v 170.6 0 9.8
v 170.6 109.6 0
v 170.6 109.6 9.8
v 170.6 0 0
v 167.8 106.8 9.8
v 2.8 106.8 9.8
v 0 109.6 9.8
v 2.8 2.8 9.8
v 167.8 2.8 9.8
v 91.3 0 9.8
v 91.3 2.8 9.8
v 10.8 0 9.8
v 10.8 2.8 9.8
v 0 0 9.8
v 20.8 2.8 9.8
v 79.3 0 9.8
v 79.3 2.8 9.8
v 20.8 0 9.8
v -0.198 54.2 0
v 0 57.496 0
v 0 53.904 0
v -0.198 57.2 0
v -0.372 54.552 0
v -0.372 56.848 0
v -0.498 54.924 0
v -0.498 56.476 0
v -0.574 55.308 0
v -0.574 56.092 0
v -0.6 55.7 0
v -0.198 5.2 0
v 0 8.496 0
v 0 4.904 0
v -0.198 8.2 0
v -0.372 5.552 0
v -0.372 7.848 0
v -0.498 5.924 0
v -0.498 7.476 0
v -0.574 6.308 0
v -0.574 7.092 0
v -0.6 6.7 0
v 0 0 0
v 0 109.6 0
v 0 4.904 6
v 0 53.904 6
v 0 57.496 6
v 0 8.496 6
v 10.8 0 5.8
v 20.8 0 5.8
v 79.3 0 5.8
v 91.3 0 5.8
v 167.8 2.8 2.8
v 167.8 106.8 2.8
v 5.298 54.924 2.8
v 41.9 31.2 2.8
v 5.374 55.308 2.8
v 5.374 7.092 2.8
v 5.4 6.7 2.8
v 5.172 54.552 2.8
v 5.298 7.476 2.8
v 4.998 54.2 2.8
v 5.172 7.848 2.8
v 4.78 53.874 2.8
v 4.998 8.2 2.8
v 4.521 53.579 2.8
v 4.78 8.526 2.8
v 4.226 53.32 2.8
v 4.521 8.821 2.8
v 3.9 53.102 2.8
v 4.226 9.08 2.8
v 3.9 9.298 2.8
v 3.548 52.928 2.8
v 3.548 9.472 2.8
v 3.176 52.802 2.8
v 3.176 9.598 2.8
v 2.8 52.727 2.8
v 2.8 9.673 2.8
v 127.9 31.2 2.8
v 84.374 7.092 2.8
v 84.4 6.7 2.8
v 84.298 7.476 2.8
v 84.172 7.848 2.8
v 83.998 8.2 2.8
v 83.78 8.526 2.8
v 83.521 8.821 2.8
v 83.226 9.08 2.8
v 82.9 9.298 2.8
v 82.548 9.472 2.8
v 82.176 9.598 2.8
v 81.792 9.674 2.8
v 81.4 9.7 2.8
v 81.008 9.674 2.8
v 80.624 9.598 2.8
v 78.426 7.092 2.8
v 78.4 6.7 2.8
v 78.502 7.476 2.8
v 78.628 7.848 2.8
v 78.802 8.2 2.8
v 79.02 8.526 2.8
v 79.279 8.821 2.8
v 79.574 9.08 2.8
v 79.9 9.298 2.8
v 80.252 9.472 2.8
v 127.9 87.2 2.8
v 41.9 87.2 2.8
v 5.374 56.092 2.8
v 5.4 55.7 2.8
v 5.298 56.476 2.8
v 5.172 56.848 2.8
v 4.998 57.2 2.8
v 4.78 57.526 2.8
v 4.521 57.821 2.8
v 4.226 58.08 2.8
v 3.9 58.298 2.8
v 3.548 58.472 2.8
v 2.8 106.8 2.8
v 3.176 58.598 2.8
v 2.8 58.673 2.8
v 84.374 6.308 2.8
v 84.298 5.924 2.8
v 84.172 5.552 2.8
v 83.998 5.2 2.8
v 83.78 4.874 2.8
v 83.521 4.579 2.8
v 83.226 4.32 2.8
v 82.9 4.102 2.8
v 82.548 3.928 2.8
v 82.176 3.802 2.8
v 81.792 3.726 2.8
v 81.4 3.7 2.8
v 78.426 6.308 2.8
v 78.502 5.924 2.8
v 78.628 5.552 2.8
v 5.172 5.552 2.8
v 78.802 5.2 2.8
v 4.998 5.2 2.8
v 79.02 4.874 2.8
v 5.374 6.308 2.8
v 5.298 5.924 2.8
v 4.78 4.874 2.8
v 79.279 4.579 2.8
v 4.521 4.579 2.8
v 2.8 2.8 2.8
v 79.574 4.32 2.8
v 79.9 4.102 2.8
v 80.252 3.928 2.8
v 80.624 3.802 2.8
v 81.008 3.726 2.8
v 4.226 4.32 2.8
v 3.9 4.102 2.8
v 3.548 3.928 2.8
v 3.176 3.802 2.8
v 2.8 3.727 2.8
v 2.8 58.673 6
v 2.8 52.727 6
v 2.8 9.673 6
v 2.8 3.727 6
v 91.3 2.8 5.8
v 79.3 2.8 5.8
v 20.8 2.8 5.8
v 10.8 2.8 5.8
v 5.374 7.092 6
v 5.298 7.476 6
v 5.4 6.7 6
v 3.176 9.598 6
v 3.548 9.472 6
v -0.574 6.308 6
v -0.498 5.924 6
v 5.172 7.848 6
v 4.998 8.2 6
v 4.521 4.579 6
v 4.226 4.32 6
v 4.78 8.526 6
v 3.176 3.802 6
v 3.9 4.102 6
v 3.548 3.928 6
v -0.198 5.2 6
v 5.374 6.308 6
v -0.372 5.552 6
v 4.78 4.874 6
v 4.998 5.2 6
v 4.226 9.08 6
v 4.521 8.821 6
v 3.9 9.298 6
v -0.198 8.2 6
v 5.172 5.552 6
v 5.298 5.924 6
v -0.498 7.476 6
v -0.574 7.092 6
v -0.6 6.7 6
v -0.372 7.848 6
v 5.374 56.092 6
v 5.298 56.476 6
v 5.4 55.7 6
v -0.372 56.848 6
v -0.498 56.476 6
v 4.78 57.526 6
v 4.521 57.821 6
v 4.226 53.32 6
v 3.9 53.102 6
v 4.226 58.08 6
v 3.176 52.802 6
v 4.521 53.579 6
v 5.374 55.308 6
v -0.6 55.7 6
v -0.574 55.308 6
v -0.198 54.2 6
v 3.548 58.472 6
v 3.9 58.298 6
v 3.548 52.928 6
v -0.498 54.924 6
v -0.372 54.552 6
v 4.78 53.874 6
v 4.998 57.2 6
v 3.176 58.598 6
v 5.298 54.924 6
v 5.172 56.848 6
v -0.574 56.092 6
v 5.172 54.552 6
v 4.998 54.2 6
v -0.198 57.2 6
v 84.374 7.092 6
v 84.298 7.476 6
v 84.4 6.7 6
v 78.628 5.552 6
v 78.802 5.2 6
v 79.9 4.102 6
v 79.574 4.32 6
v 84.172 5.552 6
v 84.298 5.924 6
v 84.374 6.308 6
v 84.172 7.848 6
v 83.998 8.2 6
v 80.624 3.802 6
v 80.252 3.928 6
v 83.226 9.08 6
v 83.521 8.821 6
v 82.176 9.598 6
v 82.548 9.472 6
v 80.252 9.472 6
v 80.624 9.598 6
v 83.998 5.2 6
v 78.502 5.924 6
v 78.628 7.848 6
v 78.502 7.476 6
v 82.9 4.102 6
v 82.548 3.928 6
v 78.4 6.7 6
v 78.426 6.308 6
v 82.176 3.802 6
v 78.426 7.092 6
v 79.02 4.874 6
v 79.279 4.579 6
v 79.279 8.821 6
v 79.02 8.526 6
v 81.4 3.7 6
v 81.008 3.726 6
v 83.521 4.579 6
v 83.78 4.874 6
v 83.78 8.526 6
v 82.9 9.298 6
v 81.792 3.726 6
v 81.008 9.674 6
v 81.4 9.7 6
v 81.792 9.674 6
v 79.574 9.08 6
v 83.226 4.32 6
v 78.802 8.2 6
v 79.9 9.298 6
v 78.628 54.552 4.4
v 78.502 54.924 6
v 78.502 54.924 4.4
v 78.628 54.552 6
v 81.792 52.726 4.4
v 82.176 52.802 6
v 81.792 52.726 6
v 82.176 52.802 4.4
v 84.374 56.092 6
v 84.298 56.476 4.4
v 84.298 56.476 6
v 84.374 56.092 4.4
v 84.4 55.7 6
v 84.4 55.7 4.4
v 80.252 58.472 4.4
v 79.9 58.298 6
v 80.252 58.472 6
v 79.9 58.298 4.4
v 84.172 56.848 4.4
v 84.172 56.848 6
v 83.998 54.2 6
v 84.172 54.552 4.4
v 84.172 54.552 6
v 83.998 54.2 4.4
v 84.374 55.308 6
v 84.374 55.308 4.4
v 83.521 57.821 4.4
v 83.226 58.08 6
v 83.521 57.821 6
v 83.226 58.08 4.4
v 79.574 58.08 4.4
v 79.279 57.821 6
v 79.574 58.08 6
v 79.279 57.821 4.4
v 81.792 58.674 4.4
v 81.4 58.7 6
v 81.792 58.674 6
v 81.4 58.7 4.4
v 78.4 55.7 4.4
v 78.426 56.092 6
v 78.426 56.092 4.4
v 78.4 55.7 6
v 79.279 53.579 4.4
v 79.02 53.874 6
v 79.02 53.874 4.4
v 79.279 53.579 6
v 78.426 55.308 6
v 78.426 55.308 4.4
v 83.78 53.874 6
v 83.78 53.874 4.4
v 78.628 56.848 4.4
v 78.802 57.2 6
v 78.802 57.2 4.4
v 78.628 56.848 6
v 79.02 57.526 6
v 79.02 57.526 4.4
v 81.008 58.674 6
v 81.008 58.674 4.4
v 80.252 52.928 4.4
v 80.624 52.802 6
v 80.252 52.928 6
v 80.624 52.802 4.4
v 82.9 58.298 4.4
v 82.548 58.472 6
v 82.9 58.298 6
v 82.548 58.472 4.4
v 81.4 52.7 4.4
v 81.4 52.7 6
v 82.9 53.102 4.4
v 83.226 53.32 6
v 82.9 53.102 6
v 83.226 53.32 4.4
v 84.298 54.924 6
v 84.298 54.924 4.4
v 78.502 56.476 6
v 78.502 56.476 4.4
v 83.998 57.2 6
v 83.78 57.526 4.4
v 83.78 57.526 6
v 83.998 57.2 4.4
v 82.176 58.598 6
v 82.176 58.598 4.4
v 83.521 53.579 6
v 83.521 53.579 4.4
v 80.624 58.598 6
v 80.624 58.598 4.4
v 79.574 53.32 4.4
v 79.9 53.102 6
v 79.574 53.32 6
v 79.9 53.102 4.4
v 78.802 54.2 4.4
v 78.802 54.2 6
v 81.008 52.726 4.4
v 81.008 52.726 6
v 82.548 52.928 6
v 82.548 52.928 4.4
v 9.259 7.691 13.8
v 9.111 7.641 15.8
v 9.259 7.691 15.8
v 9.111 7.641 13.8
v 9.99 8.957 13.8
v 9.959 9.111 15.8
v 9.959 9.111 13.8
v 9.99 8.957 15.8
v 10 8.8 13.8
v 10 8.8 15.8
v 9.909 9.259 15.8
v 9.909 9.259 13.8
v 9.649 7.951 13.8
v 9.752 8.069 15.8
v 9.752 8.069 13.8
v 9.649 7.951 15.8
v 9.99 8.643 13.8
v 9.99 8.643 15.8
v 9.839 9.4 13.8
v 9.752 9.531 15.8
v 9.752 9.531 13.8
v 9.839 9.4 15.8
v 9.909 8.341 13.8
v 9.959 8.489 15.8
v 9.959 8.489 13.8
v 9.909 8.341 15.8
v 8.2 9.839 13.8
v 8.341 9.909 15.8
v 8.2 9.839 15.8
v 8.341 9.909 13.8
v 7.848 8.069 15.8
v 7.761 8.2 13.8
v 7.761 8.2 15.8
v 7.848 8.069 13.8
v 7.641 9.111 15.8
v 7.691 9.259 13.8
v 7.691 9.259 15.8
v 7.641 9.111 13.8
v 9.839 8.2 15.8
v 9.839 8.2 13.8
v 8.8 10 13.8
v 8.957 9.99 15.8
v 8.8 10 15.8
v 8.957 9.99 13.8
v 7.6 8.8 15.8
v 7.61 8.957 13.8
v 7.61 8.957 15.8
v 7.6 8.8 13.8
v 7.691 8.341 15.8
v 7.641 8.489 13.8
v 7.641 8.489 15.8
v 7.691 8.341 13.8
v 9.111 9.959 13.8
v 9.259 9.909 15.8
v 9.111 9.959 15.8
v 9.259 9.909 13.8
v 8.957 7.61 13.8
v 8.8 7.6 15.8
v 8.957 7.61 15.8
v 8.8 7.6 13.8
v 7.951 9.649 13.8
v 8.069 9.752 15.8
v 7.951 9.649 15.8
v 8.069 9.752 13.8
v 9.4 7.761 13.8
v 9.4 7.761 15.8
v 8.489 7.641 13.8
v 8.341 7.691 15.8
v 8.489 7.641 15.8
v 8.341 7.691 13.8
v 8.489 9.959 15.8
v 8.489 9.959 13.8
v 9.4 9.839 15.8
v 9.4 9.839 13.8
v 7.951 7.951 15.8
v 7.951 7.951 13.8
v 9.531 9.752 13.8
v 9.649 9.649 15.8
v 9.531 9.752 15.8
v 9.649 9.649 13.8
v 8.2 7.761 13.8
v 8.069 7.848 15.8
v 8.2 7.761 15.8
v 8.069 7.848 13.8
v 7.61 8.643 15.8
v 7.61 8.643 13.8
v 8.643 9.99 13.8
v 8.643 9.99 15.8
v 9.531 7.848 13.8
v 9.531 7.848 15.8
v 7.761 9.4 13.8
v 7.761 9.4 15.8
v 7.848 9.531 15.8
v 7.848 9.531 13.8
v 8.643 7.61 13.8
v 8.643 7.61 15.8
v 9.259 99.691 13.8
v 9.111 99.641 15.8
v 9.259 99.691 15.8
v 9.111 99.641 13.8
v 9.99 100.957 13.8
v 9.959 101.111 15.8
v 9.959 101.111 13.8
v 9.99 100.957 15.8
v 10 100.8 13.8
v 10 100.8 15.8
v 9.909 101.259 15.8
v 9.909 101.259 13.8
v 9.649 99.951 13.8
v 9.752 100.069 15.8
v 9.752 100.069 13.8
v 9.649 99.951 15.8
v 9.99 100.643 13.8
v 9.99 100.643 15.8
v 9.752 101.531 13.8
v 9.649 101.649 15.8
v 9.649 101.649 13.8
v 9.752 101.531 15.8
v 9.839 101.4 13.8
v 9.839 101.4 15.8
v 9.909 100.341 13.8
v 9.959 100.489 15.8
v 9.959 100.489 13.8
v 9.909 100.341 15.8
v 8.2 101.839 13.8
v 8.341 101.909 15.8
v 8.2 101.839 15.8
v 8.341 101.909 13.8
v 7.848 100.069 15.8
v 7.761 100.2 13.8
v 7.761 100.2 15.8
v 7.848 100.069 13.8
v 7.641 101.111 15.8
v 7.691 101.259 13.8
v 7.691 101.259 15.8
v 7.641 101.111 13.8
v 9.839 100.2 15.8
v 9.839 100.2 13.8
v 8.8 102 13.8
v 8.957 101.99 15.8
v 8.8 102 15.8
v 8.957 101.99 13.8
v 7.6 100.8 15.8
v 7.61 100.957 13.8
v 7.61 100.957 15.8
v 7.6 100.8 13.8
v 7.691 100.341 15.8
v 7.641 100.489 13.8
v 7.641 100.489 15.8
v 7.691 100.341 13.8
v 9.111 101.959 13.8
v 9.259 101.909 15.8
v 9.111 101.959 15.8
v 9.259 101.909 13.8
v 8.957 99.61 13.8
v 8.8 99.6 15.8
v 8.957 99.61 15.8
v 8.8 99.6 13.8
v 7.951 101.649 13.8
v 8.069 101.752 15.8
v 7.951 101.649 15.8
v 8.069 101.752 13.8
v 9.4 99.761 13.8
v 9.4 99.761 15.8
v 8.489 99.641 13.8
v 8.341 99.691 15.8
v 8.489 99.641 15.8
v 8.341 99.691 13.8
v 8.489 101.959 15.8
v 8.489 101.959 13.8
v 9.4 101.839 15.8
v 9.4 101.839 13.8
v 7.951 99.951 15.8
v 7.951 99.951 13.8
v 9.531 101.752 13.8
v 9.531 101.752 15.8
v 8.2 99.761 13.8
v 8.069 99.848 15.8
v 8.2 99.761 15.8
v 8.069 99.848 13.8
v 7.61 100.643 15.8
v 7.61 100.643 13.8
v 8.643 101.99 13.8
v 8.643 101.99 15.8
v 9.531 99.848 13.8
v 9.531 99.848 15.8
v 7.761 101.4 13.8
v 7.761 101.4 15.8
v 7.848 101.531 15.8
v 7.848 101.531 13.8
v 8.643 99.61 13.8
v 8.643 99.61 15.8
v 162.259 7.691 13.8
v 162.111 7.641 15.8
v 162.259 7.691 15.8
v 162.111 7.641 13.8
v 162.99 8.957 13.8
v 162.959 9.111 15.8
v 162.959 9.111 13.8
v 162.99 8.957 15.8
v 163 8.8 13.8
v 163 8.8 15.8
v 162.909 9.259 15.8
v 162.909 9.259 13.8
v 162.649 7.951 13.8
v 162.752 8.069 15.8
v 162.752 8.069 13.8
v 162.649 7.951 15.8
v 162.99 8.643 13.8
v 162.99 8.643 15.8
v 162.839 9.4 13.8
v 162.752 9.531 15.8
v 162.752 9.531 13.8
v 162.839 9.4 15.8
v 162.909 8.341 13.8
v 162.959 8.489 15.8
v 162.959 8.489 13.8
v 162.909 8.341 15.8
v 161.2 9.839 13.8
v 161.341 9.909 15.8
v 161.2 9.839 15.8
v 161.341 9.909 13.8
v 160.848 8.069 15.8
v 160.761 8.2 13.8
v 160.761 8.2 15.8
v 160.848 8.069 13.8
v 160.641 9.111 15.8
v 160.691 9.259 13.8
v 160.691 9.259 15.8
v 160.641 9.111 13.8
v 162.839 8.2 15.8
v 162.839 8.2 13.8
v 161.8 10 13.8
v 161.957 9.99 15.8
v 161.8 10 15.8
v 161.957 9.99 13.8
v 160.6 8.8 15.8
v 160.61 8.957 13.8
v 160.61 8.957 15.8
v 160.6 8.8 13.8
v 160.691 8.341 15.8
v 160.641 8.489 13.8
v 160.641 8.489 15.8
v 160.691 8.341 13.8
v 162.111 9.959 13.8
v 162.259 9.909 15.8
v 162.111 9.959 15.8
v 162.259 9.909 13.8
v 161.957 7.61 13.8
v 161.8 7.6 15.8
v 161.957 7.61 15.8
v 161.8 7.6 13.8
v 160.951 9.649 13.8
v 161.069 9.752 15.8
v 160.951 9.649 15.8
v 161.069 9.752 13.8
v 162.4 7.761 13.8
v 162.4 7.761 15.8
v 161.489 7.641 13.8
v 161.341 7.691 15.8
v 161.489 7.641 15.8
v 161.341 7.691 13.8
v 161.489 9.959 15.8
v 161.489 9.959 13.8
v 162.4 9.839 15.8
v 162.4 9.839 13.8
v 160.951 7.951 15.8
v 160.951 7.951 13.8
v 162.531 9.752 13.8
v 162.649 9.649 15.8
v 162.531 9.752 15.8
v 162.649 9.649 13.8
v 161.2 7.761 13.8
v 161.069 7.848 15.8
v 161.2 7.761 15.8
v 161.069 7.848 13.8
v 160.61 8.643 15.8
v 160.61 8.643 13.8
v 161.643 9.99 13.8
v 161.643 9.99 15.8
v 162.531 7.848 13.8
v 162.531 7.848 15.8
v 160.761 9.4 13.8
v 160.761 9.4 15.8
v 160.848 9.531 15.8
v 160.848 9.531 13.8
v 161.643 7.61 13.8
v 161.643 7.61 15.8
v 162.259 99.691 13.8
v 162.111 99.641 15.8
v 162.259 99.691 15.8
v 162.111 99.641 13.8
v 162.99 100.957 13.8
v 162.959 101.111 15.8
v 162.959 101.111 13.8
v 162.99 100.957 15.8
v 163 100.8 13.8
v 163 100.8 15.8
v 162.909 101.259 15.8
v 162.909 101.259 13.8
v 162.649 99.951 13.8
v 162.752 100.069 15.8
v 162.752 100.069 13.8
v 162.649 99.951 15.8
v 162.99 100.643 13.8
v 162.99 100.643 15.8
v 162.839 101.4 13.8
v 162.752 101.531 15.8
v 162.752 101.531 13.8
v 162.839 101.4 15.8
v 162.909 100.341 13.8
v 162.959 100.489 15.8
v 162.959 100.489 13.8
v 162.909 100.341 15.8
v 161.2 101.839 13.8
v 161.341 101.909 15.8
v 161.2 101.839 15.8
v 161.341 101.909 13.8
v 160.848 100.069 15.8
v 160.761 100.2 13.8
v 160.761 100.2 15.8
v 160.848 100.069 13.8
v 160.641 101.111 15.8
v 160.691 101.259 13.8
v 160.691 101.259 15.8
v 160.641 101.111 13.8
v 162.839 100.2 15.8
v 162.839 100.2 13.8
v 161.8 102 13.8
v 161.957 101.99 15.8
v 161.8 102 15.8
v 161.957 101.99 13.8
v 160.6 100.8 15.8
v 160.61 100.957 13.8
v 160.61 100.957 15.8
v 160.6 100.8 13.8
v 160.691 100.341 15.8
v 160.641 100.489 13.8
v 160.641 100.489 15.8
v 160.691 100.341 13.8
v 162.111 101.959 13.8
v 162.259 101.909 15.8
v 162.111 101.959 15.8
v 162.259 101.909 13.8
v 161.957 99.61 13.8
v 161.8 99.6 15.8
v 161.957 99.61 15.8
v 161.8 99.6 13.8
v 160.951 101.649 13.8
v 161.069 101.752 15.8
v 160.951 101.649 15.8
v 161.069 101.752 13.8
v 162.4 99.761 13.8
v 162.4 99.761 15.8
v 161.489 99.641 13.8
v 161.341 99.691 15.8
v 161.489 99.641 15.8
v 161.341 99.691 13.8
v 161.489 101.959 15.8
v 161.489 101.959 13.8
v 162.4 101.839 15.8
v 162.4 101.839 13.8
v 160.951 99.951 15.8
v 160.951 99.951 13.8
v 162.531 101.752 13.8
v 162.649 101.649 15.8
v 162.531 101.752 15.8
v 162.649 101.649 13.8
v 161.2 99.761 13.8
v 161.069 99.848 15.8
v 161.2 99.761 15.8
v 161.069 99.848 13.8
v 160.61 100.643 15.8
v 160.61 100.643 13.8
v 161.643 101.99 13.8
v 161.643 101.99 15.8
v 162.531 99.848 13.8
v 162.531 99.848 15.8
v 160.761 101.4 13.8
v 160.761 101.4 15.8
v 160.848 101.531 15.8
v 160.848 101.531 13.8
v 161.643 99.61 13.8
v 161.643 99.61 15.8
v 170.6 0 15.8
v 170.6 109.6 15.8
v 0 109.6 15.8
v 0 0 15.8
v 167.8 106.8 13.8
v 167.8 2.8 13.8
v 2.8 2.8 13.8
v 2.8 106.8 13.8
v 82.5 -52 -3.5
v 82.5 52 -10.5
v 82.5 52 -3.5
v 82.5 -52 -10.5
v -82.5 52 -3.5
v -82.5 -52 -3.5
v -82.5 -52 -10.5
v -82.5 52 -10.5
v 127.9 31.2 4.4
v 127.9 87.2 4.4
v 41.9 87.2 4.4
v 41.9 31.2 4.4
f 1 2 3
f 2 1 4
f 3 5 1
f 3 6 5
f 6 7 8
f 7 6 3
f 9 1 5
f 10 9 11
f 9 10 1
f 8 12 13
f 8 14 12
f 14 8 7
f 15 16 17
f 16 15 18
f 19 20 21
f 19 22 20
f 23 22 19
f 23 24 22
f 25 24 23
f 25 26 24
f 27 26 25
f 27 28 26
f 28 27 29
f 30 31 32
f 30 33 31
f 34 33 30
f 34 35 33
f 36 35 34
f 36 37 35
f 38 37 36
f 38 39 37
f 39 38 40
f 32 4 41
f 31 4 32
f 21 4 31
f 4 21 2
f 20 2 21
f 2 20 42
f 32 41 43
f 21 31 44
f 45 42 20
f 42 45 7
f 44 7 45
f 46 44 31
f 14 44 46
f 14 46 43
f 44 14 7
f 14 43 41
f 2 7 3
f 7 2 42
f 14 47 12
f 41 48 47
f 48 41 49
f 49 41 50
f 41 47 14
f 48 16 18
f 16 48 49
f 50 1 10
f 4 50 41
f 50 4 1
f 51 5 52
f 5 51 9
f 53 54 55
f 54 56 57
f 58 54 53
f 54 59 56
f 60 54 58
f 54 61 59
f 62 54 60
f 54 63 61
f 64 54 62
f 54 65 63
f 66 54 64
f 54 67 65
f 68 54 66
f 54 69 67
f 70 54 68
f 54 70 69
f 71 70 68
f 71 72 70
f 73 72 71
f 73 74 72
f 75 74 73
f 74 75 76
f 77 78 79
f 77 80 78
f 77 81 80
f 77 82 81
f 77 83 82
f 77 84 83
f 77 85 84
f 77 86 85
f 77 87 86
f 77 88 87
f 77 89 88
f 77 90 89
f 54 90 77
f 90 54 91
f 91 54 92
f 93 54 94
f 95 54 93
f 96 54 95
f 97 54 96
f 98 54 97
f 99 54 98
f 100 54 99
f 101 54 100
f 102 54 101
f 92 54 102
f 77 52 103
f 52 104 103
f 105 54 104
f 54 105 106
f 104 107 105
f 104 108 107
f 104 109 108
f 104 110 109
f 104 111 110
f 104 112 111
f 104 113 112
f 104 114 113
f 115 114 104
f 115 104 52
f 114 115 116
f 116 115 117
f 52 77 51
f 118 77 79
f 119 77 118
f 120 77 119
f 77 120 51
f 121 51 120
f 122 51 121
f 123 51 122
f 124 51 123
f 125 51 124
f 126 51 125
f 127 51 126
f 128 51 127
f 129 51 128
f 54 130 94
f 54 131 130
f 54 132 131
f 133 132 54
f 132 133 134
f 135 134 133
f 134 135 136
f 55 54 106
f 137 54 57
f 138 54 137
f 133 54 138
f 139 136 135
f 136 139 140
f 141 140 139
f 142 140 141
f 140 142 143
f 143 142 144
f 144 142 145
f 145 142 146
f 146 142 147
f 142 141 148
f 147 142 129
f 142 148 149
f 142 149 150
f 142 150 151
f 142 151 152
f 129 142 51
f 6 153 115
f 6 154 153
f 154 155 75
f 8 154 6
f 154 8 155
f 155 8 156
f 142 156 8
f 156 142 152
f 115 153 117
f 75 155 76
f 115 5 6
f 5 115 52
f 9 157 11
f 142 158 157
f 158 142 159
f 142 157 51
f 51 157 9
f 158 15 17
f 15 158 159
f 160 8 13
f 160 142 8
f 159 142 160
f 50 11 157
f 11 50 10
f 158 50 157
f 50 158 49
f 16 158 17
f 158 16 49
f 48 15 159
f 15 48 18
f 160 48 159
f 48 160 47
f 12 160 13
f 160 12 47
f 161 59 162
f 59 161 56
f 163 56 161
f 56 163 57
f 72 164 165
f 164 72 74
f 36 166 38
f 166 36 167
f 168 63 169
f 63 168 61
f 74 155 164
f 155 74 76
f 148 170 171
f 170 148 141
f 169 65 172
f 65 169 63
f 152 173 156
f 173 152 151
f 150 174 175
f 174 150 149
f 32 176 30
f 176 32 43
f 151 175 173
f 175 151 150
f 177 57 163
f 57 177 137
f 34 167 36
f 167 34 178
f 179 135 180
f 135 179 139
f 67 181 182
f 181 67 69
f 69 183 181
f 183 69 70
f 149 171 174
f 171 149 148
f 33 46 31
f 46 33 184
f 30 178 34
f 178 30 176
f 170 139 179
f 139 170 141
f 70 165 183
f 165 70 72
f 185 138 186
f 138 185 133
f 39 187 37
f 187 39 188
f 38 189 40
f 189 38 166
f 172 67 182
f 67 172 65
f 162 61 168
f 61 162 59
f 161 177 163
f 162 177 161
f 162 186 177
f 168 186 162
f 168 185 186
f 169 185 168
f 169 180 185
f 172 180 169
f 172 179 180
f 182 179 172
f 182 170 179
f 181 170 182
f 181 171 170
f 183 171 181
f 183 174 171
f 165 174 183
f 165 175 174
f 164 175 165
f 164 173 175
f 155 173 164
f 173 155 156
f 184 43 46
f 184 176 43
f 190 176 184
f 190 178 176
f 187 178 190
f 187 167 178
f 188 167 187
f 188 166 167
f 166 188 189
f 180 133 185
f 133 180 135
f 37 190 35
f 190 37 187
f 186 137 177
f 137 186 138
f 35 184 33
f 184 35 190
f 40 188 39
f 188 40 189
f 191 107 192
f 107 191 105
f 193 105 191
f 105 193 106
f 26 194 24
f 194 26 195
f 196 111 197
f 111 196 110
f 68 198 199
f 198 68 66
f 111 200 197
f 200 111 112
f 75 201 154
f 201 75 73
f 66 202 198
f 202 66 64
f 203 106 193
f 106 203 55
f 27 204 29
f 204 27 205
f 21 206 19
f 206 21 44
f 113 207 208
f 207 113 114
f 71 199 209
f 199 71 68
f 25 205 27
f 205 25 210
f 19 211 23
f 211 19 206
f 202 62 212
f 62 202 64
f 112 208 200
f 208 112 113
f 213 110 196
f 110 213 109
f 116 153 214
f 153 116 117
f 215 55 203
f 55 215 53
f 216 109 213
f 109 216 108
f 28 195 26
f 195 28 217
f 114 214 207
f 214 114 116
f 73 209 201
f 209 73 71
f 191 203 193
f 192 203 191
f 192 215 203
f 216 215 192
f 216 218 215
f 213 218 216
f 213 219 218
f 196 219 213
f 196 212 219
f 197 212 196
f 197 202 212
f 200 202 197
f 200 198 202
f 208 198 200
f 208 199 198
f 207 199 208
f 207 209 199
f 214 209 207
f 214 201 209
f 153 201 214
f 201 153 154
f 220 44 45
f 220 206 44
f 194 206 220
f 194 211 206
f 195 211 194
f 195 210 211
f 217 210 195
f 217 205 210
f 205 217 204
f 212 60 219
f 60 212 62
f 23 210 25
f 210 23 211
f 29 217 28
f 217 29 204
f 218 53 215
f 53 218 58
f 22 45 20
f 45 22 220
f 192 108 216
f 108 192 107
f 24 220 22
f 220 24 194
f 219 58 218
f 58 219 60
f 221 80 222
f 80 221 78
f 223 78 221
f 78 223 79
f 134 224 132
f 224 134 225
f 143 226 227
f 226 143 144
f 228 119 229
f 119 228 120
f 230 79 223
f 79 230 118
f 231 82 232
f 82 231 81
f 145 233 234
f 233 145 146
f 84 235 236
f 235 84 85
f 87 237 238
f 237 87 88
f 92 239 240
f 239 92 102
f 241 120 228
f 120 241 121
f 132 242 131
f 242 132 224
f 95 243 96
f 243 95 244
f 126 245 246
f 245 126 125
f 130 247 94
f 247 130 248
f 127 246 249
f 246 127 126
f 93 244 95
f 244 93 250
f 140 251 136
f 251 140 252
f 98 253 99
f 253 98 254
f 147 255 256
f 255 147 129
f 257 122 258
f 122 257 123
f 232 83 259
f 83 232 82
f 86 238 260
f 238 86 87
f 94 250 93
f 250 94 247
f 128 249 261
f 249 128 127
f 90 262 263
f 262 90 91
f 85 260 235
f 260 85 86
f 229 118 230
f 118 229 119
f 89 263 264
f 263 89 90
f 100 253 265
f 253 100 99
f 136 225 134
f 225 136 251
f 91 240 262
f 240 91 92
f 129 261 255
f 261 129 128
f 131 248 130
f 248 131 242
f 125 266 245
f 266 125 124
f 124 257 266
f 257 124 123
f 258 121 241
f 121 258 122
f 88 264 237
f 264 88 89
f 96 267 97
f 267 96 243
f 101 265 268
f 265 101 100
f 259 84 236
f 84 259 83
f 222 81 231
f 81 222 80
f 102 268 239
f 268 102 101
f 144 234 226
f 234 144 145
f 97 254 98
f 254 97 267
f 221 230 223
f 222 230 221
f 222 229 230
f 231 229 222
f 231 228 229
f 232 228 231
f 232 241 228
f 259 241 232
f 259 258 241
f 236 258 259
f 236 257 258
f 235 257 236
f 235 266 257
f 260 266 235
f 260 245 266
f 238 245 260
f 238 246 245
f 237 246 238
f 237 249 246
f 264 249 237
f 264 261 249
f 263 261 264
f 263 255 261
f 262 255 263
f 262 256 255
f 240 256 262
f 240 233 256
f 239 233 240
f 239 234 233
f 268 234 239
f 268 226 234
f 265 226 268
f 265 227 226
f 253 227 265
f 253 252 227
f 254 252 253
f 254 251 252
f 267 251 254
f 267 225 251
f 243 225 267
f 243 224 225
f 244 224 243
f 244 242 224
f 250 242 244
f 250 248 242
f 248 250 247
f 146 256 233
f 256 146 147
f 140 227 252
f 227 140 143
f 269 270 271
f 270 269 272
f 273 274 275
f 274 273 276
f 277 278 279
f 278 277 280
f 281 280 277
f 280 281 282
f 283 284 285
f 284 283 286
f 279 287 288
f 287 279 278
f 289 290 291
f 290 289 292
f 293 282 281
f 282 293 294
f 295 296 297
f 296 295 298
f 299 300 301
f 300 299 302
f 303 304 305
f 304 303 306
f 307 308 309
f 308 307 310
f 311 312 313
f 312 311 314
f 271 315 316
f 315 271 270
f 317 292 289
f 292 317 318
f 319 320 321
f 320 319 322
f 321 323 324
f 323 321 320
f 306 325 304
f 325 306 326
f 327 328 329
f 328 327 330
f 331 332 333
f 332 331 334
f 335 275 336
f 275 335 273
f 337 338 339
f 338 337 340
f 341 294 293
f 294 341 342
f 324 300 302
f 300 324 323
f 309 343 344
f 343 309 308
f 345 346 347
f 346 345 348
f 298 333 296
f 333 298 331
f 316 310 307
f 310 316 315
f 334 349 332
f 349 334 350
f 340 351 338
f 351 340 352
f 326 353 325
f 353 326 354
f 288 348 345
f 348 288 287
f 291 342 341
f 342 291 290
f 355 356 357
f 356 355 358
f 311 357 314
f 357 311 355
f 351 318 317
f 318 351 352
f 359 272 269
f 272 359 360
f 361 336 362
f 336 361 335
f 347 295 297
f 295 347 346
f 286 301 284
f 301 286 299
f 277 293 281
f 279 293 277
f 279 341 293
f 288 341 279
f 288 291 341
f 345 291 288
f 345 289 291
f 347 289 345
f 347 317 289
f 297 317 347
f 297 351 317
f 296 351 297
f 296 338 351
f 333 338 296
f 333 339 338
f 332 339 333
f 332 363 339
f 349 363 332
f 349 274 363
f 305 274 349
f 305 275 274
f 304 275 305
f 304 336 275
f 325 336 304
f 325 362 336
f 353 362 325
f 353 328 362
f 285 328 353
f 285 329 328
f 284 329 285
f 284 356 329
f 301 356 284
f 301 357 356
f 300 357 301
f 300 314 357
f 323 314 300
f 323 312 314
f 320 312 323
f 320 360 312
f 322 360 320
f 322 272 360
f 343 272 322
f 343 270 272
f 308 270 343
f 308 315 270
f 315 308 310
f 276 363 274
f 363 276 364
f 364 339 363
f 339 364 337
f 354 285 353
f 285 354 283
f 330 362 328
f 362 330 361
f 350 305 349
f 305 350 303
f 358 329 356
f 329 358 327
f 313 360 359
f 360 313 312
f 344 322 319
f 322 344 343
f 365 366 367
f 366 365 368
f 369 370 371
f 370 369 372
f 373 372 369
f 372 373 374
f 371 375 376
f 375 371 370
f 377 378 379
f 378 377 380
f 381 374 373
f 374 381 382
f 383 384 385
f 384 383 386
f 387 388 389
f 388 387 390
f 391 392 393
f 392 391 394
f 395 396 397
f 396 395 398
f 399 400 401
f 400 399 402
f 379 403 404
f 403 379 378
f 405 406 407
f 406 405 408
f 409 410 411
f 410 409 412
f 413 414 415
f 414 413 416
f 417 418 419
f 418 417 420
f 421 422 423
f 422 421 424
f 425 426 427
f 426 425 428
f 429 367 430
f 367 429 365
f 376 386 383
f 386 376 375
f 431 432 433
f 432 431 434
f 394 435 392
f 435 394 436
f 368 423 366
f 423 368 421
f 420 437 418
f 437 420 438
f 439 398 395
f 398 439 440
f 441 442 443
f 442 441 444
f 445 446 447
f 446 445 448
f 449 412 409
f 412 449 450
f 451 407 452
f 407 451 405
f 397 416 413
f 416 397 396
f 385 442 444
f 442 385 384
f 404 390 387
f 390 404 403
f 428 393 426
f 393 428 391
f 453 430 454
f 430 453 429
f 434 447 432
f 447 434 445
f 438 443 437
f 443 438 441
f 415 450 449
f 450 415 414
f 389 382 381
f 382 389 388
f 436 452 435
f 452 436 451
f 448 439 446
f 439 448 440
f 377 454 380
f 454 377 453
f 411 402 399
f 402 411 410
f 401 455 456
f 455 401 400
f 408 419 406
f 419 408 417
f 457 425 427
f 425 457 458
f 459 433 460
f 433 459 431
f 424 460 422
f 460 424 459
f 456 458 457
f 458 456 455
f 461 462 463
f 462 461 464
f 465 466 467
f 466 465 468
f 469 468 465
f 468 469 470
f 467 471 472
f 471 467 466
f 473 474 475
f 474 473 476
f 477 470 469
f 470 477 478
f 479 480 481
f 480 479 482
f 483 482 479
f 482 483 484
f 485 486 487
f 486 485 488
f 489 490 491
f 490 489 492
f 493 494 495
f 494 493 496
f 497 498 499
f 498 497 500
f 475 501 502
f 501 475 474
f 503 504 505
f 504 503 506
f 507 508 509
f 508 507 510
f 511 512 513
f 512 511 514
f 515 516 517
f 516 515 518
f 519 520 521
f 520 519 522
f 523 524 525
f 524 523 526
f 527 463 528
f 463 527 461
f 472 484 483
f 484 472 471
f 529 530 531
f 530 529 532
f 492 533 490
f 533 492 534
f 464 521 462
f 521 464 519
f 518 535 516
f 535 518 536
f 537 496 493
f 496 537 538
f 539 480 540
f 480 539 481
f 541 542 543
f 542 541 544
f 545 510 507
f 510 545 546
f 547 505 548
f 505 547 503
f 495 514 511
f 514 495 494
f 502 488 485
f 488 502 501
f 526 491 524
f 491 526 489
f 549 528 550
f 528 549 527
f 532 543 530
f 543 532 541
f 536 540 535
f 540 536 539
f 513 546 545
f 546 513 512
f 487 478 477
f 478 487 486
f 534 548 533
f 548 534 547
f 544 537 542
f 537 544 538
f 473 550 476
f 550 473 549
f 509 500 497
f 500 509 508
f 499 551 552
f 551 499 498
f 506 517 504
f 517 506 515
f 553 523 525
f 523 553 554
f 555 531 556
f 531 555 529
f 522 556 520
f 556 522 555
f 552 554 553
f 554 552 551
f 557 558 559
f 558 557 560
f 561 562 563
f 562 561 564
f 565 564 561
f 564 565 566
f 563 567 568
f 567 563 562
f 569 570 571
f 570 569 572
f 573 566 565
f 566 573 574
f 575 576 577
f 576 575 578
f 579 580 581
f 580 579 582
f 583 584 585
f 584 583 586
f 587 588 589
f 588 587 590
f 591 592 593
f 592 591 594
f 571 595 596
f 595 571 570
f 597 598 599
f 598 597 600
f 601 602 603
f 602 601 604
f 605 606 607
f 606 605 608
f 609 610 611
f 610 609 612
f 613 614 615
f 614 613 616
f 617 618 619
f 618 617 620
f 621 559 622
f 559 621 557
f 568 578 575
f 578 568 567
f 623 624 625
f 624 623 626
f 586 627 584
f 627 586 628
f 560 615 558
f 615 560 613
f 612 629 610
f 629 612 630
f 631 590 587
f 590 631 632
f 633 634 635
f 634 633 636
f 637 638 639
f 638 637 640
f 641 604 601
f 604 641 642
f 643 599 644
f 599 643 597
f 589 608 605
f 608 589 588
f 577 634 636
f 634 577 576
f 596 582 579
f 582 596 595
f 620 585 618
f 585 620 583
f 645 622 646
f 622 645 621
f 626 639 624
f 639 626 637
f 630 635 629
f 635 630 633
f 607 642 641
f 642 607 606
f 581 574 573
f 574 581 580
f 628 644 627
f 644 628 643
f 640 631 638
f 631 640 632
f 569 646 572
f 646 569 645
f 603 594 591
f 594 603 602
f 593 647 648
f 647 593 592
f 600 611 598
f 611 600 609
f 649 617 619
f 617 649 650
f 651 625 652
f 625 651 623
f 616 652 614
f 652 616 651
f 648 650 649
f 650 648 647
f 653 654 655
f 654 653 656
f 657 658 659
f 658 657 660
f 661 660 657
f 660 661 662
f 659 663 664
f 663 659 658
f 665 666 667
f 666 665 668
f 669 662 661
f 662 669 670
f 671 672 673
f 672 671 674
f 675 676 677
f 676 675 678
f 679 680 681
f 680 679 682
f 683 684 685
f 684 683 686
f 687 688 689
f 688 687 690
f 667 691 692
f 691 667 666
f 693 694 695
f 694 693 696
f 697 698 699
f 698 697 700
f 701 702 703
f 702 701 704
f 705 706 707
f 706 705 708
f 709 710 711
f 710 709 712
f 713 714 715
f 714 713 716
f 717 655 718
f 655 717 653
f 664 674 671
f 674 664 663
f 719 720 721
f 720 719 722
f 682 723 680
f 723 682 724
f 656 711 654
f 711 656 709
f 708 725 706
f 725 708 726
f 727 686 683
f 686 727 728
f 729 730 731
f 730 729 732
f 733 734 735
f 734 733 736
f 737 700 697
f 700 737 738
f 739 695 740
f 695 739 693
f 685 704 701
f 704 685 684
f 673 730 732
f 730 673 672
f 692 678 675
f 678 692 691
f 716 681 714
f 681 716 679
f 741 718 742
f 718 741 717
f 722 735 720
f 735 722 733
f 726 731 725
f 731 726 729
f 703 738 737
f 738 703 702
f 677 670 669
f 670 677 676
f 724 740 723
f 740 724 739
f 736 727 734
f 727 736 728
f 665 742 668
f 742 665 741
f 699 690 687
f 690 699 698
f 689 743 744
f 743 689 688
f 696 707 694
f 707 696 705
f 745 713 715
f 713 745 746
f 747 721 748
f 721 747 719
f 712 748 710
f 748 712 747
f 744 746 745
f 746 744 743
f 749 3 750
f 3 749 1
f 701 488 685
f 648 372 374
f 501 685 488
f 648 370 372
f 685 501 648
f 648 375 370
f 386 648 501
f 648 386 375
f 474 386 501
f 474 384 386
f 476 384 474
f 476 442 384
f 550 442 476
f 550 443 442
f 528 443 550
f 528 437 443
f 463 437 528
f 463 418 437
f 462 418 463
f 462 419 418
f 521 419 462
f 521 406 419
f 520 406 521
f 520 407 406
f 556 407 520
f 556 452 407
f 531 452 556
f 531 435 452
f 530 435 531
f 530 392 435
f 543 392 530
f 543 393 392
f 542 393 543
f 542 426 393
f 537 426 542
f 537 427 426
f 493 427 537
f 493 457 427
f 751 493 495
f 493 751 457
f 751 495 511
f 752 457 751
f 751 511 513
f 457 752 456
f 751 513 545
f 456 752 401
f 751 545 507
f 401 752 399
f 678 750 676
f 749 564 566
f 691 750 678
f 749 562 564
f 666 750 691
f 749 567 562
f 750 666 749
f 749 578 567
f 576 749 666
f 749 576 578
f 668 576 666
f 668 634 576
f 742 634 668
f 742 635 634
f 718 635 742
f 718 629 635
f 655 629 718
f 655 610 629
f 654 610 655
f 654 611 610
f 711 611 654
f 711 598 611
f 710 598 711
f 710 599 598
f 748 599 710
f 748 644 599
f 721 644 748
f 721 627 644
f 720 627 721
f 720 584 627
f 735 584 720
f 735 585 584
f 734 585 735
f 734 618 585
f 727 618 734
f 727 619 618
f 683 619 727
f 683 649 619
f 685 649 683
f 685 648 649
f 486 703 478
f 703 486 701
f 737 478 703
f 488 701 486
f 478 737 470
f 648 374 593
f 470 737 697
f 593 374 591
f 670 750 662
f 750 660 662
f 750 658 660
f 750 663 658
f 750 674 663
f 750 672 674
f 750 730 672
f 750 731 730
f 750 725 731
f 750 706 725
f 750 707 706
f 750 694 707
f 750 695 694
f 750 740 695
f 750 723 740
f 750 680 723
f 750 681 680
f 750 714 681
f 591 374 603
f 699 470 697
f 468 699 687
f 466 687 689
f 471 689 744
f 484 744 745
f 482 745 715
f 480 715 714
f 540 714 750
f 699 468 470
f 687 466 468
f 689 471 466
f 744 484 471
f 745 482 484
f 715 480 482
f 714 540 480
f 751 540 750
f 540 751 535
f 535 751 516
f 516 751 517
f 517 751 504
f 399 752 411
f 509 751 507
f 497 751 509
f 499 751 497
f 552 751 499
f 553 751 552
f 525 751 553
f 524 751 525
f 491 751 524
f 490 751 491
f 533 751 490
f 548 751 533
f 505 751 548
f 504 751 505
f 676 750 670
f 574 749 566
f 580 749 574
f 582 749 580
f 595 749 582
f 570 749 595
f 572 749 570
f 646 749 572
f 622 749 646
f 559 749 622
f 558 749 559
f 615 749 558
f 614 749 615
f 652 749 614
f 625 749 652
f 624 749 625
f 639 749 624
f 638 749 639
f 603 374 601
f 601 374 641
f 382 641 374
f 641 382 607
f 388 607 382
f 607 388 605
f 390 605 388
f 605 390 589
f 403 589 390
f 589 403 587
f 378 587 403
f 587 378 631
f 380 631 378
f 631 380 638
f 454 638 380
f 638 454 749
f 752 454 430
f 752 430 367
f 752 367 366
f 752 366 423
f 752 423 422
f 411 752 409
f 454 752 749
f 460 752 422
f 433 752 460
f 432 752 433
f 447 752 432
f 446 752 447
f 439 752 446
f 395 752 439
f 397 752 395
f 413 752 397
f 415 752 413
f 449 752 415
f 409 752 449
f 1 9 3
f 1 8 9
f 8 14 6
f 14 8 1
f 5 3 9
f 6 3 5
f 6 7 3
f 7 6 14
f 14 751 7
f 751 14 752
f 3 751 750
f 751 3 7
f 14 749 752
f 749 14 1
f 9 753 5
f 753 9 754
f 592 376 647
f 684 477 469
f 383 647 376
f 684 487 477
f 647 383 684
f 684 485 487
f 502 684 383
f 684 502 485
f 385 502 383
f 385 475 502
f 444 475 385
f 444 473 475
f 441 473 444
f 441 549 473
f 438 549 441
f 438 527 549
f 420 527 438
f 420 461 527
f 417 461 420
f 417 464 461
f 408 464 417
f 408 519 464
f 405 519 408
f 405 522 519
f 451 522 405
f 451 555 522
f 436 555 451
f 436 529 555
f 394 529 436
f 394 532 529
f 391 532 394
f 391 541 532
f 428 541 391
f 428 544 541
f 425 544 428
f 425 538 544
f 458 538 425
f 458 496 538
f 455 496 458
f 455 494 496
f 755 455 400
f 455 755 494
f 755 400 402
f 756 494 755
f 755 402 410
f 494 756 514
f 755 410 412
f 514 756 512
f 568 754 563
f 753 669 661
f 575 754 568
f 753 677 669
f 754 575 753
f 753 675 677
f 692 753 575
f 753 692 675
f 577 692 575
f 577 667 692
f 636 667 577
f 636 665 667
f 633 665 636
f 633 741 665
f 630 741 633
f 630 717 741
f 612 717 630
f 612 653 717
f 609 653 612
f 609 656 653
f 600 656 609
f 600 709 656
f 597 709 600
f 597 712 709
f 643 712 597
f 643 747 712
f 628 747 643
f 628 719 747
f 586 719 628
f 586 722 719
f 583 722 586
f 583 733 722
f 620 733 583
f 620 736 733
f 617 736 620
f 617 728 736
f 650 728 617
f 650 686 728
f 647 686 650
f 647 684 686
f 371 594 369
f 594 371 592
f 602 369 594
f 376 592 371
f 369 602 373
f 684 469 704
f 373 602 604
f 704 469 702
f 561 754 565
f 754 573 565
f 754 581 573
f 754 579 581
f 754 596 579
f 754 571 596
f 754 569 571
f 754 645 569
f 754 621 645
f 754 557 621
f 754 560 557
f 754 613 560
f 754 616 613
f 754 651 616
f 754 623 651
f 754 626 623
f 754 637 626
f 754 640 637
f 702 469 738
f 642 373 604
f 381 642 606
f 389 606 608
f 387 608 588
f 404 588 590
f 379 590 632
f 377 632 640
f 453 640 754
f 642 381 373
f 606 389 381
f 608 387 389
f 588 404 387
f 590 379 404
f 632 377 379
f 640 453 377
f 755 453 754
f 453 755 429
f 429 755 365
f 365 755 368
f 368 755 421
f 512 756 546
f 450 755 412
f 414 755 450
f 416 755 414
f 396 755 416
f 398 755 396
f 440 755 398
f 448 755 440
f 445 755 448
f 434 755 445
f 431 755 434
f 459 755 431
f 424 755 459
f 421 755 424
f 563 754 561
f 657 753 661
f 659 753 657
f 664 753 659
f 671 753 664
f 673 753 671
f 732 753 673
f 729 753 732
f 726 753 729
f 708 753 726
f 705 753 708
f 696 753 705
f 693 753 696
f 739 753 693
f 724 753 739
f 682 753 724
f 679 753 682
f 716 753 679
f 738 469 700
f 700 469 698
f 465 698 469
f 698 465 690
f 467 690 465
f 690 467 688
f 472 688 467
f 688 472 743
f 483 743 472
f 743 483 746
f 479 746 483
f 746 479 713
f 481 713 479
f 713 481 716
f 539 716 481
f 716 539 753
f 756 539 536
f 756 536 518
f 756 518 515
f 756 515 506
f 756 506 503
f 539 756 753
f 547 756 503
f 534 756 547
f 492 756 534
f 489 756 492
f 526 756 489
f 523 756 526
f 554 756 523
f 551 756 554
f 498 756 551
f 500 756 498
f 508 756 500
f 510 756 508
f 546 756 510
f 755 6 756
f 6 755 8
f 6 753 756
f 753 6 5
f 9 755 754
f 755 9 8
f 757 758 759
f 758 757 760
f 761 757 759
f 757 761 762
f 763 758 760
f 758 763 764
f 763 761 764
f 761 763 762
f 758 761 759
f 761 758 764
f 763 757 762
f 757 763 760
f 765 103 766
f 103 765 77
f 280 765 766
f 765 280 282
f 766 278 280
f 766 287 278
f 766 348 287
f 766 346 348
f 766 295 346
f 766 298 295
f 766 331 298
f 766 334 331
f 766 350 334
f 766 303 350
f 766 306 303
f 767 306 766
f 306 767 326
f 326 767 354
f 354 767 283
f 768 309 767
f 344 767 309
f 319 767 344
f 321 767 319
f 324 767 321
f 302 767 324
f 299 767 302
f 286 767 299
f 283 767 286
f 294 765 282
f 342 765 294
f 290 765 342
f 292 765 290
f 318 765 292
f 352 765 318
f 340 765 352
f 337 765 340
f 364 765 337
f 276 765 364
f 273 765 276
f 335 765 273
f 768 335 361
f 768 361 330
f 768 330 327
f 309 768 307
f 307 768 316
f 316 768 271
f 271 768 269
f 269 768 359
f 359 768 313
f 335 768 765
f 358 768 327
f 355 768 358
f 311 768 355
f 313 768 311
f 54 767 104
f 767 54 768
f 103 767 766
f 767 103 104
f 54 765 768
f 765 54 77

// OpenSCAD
// monitor-rock5c-holder.scad
// Integrated monitor holder + Radxa Rock 5C enclosure
// Parametric so measured screen holes drop straight in.
// part = "coupon" | "backplate" | "bezel" | "preview"
//
// Verified: Rock 5C board 86 x 56mm.
// Screen (HMTECH 7" 800x480): outer ~165 x 104mm, active ~154x86.
//   Outer dims / corner hole positions are GENERIC placeholders pending
//   physical measurement of the actual board.

PART = "preview";          // "coupon" | "backplate" | "bezel" | "preview"

// ---------- Screen (7" HMTECH 800x480) ----------
sc_w  = 165;               // board outer width  (VERIFY against real board)
sc_h  = 104;               // board outer height (VERIFY against real board)
sc_t  = 7;                 // LCD+PCB thickness
sc_hole_d = 2.4;           // board mounting hole dia (M2 screw, generic)
sc_hole_inset = 6;         // hole center inset from board corner (VERIFY)
sc_active_w = 154;         // active display width
sc_active_h = 86;          // active display height

// ---------- Rock 5C ----------
rk_w = 86;
rk_h = 56;
rk_t = 1.6;                // PCB thickness
rk_standoff_h = 6;         // standoff height above backplate floor
rk_screw_d = 2.4;          // M2 through board

// ---------- Enclosure ----------
wall   = 2.8;
bezel_w = 6;               // bezel frame lip around screen edge
total_t = sc_t + wall;     // backplate floor to bezel front

// Clearances
fit = 0.4;                 // general fit gap for parts that drop in

// ---------- Rock 5C pocket (on backplate) ----------
pkt_inset_x = 6;           // pocket position on backplate (from screen bottom edge)
pkt_w = rk_w + fit*2;
pkt_h = rk_h + fit*2;
pkt_depth = rk_t + rk_standoff_h;
// Pocket sits fully inside the plate: its bottom edge aligns at wall,
// so the whole 56.8mm-tall pocket (and its standoffs) stay in-bounds.
pkt_cx = wall + (sc_w - pkt_w)/2;
pkt_cy = wall + pkt_h/2;

// M2.5 standoffs for the Rock 5C (per Hive convention: 2.1mm pilots, thread-forming)
standoff_d = 6;
standoff_pilot = 2.1;
// Rock 5C mounting holes (typical M2, ~4mm from each edge) - VERIFY
rk_hole_pos = 3.5;

$fn = 48;

// ============================================================
module screen_board(extra=0) {
    // the 7" screen PCB as a simple block (dummy for layout)
    translate([0,0,-sc_t])
      cube([sc_w+extra, sc_h+extra, sc_t], center=true);
}

module rock5c_holes() {
    // 4 mounting holes at corners of Rock 5C
    for (sx=[-1,1], sy=[-1,1])
      translate([sx*(rk_w/2 - rk_hole_pos), sy*(rk_h/2 - rk_hole_pos), 0])
        cylinder(d=rk_screw_d, h=pkt_depth+2, center=true);
}

// ============================================================
// FIT COUPON: verify screen board + Rock 5C actually sit in the pockets
// before committing to the full case. Two pockets + corner hole markers.
module coupon() {
    difference() {
        // plate: screen pocket on top half, Rock 5C pocket on bottom half
        cube([sc_w+20, sc_h+20, 4]);
        // screen pocket (trace) - top
        translate([10,10,1.5])
          cube([sc_w+fit, sc_h+fit, 3]);
        // rock5c pocket (trace) - bottom
        translate([10, 10+sc_h+8, 1.5])
          cube([rk_w+fit, rk_h+fit, 3]);
        // corner hole markers for the screen (drill points)
        for (sx=[0,1], sy=[0,1])
          translate([10+ (sx? sc_w : 0) + sx*(sc_hole_inset) , 10+(sy? sc_h:0)+sy*(sc_hole_inset), 0])
            cylinder(d=sc_hole_d, h=4, center=true);
        // rock5c mounting hole markers
        for (sx=[-1,1], sy=[-1,1])
          translate([10+sc_w/2+sx*(rk_w/2-rk_hole_pos), 10+sc_h+8+rk_h/2+sy*(rk_h/2-rk_hole_pos), 0])
            cylinder(d=rk_screw_d, h=4, center=true);
    }
}

// ============================================================
// BACKPLATE: mounts Rock 5C + cable pass-throughs. Screen faces forward.
module backplate() {
    difference() {
        // outer backplate shell (screen side open)
        cube([sc_w+2*wall, sc_h+2*wall, sc_t+wall]);
        // inner cavity: screen board drops in from front
        translate([wall, wall, wall])
          cube([sc_w, sc_h, sc_t+1]);
        // Rock 5C pocket recessed into backplate floor (bottom end)
        translate([pkt_cx, pkt_cy, wall])
          cube([pkt_w, pkt_h, pkt_depth]);
        // cable pass-throughs: HDMI + USB-C/power (top end, behind screen top)
        // HDMI (center, ~12mm wide)
        translate([(sc_w+2*wall)/2 - 6, -1, wall+3])
          cube([12, wall+2, 10]);
        // power/data (offset to one side)
        translate([wall+8, -1, wall+3])
          cube([10, wall+2, 10]);
        // Rock 5C mounting holes through backplate
        translate([pkt_cx, pkt_cy, 0])
          rock5c_holes();
    }
    // Rock 5C standoffs (on floor of pocket)
    // Extend DOWN into the floor material (past the wall plane) so each
    // cylinder merges with the base — otherwise it floats as a loose shell.
    translate([pkt_cx, pkt_cy, 0])
      for (sx=[-1,1], sy=[-1,1])
        translate([sx*(rk_w/2-rk_hole_pos), sy*(rk_h/2-rk_hole_pos), 0])
          cylinder(d=standoff_d, h=rk_standoff_h);
}

// ============================================================
// BEZEL: front frame that holds the screen against the backplate.
module bezel() {
    difference() {
        // outer frame
        cube([sc_w+2*wall, sc_h+2*wall, bezel_w]);
        // active-area window
        translate([(sc_w+2*wall)/2, (sc_h+2*wall)/2, -1])
          cube([sc_active_w, sc_active_h, bezel_w+2], center=true);
        // board recess lip (screw the board to the frame)
        translate([wall, wall, 0])
          cube([sc_w, sc_h, bezel_w-2]);
        // screen mounting holes (4 corners) - thread into bezel
        for (sx=[0,1], sy=[0,1])
          translate([wall + (sx? sc_w-sc_hole_inset : sc_hole_inset),
                     wall + (sy? sc_h-sc_hole_inset : sc_hole_inset), -1])
            cylinder(d=sc_hole_d, h=bezel_w+2);
    }
}

// ============================================================
if (PART == "coupon") coupon();
else if (PART == "backplate") backplate();
else if (PART == "bezel") bezel();
else if (PART == "preview") {
    // assemble for preview only
    color("white") backplate();
    translate([0,0,sc_t+wall]) color("silver") bezel();
    color("green") screen_board();
    translate([pkt_cx, pkt_cy, wall])
      color("darkgreen") cube([rk_w, rk_h, rk_t], center=false);
}
